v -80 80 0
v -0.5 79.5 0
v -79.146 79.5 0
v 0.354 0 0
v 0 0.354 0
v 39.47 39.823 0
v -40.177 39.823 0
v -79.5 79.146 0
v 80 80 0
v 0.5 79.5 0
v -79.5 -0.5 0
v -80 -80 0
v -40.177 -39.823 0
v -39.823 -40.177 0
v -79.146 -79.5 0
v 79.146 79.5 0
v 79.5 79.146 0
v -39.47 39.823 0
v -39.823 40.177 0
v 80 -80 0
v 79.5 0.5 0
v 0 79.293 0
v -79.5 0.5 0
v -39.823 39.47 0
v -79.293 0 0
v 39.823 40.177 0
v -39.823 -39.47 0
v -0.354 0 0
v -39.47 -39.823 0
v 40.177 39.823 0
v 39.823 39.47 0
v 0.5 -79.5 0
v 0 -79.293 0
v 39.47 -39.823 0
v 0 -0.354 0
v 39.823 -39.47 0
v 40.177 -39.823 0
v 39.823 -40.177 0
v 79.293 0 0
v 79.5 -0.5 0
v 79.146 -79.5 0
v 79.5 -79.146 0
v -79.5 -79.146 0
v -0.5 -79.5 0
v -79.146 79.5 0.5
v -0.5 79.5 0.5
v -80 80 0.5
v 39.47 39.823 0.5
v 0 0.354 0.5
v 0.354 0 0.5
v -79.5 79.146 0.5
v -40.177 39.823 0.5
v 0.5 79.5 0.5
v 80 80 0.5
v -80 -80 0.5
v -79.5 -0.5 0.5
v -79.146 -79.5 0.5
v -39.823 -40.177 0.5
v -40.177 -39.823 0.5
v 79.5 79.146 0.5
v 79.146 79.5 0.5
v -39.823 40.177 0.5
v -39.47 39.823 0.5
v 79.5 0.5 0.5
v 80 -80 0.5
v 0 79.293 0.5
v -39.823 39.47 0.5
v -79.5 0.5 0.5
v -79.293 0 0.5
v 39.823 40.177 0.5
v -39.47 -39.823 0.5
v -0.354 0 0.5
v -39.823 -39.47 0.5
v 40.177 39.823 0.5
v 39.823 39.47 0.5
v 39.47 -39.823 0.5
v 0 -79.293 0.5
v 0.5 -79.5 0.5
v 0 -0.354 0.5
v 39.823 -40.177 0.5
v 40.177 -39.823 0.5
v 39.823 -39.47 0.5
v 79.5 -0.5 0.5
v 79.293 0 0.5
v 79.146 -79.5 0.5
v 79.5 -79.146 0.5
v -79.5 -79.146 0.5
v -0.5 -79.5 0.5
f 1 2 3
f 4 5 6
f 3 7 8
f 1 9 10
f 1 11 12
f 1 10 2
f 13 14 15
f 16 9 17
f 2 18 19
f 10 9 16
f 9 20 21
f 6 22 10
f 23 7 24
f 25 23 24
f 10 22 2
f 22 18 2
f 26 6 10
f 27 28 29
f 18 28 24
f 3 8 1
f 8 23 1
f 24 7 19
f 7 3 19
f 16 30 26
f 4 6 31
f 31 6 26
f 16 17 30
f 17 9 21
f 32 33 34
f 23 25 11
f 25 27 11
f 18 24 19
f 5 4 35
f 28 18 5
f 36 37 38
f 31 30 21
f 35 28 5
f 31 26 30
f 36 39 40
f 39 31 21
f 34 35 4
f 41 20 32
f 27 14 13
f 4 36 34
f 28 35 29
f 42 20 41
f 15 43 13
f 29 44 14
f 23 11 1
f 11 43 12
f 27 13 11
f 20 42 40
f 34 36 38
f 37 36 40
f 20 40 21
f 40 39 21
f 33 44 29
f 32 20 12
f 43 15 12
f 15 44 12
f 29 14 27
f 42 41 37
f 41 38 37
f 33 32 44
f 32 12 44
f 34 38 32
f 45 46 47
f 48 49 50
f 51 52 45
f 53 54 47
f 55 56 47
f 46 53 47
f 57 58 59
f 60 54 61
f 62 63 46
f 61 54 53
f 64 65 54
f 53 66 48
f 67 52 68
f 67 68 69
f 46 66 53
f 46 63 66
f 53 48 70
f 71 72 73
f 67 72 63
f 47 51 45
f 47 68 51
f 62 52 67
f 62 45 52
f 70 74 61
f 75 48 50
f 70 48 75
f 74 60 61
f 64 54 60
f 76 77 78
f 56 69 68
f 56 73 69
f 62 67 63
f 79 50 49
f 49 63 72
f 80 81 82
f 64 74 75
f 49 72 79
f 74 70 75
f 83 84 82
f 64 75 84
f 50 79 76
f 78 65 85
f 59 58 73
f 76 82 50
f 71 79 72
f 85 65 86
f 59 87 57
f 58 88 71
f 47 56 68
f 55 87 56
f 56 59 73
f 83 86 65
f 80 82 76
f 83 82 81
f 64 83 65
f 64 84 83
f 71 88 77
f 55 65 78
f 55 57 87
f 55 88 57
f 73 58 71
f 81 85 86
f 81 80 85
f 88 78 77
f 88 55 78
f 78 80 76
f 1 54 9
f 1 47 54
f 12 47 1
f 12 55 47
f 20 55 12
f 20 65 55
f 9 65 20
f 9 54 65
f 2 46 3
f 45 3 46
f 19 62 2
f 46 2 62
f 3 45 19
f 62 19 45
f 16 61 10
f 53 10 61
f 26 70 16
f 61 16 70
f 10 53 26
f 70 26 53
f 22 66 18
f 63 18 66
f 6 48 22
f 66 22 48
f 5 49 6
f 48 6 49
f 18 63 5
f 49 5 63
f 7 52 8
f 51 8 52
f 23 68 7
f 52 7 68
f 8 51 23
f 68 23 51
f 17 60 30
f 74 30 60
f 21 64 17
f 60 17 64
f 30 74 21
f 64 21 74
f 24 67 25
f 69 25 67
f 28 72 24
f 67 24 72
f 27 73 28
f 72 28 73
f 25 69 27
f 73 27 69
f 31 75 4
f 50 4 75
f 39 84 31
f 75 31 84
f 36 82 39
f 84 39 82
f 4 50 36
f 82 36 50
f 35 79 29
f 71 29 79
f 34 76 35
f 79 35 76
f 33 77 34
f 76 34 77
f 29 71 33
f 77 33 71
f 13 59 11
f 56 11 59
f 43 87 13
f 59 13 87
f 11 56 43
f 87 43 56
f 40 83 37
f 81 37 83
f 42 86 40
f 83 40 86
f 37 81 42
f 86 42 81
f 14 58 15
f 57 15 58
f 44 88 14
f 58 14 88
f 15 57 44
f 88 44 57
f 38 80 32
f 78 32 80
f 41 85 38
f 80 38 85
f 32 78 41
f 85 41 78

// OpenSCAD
// quick and simple nozzle distance and adhesion test.
// prints a test pattern
// 2016sep02, ls  v0.0.1 initial version
// 2016oct19, ls  v0.0.2 changed for thingiverse customiser

// determines width of traces
extrusion = 0.5;	// [0.1:0.1:3]

// specifies test pattern height
layer = 0.5;		// [0.1:0.1:5]

// dimensions. Set smaller than actual bed size because of skirt.
bed = 160;		// [80:10:300]

linear_extrude(layer)  {
   bed45 = bed*sqrt(2);

   difference()  {
      square(bed, center=true);
      square(bed-2*extrusion, center=true);
   }

   rotate([0, 0, 45])  {
      for (a=[0, 90])
      rotate([0, 0, a])
      square([extrusion, bed45-extrusion], center=true);

      difference()  {
         square(bed45/2, center=true);
         square(bed45/2-2*extrusion, center=true);
      }
   }
}
